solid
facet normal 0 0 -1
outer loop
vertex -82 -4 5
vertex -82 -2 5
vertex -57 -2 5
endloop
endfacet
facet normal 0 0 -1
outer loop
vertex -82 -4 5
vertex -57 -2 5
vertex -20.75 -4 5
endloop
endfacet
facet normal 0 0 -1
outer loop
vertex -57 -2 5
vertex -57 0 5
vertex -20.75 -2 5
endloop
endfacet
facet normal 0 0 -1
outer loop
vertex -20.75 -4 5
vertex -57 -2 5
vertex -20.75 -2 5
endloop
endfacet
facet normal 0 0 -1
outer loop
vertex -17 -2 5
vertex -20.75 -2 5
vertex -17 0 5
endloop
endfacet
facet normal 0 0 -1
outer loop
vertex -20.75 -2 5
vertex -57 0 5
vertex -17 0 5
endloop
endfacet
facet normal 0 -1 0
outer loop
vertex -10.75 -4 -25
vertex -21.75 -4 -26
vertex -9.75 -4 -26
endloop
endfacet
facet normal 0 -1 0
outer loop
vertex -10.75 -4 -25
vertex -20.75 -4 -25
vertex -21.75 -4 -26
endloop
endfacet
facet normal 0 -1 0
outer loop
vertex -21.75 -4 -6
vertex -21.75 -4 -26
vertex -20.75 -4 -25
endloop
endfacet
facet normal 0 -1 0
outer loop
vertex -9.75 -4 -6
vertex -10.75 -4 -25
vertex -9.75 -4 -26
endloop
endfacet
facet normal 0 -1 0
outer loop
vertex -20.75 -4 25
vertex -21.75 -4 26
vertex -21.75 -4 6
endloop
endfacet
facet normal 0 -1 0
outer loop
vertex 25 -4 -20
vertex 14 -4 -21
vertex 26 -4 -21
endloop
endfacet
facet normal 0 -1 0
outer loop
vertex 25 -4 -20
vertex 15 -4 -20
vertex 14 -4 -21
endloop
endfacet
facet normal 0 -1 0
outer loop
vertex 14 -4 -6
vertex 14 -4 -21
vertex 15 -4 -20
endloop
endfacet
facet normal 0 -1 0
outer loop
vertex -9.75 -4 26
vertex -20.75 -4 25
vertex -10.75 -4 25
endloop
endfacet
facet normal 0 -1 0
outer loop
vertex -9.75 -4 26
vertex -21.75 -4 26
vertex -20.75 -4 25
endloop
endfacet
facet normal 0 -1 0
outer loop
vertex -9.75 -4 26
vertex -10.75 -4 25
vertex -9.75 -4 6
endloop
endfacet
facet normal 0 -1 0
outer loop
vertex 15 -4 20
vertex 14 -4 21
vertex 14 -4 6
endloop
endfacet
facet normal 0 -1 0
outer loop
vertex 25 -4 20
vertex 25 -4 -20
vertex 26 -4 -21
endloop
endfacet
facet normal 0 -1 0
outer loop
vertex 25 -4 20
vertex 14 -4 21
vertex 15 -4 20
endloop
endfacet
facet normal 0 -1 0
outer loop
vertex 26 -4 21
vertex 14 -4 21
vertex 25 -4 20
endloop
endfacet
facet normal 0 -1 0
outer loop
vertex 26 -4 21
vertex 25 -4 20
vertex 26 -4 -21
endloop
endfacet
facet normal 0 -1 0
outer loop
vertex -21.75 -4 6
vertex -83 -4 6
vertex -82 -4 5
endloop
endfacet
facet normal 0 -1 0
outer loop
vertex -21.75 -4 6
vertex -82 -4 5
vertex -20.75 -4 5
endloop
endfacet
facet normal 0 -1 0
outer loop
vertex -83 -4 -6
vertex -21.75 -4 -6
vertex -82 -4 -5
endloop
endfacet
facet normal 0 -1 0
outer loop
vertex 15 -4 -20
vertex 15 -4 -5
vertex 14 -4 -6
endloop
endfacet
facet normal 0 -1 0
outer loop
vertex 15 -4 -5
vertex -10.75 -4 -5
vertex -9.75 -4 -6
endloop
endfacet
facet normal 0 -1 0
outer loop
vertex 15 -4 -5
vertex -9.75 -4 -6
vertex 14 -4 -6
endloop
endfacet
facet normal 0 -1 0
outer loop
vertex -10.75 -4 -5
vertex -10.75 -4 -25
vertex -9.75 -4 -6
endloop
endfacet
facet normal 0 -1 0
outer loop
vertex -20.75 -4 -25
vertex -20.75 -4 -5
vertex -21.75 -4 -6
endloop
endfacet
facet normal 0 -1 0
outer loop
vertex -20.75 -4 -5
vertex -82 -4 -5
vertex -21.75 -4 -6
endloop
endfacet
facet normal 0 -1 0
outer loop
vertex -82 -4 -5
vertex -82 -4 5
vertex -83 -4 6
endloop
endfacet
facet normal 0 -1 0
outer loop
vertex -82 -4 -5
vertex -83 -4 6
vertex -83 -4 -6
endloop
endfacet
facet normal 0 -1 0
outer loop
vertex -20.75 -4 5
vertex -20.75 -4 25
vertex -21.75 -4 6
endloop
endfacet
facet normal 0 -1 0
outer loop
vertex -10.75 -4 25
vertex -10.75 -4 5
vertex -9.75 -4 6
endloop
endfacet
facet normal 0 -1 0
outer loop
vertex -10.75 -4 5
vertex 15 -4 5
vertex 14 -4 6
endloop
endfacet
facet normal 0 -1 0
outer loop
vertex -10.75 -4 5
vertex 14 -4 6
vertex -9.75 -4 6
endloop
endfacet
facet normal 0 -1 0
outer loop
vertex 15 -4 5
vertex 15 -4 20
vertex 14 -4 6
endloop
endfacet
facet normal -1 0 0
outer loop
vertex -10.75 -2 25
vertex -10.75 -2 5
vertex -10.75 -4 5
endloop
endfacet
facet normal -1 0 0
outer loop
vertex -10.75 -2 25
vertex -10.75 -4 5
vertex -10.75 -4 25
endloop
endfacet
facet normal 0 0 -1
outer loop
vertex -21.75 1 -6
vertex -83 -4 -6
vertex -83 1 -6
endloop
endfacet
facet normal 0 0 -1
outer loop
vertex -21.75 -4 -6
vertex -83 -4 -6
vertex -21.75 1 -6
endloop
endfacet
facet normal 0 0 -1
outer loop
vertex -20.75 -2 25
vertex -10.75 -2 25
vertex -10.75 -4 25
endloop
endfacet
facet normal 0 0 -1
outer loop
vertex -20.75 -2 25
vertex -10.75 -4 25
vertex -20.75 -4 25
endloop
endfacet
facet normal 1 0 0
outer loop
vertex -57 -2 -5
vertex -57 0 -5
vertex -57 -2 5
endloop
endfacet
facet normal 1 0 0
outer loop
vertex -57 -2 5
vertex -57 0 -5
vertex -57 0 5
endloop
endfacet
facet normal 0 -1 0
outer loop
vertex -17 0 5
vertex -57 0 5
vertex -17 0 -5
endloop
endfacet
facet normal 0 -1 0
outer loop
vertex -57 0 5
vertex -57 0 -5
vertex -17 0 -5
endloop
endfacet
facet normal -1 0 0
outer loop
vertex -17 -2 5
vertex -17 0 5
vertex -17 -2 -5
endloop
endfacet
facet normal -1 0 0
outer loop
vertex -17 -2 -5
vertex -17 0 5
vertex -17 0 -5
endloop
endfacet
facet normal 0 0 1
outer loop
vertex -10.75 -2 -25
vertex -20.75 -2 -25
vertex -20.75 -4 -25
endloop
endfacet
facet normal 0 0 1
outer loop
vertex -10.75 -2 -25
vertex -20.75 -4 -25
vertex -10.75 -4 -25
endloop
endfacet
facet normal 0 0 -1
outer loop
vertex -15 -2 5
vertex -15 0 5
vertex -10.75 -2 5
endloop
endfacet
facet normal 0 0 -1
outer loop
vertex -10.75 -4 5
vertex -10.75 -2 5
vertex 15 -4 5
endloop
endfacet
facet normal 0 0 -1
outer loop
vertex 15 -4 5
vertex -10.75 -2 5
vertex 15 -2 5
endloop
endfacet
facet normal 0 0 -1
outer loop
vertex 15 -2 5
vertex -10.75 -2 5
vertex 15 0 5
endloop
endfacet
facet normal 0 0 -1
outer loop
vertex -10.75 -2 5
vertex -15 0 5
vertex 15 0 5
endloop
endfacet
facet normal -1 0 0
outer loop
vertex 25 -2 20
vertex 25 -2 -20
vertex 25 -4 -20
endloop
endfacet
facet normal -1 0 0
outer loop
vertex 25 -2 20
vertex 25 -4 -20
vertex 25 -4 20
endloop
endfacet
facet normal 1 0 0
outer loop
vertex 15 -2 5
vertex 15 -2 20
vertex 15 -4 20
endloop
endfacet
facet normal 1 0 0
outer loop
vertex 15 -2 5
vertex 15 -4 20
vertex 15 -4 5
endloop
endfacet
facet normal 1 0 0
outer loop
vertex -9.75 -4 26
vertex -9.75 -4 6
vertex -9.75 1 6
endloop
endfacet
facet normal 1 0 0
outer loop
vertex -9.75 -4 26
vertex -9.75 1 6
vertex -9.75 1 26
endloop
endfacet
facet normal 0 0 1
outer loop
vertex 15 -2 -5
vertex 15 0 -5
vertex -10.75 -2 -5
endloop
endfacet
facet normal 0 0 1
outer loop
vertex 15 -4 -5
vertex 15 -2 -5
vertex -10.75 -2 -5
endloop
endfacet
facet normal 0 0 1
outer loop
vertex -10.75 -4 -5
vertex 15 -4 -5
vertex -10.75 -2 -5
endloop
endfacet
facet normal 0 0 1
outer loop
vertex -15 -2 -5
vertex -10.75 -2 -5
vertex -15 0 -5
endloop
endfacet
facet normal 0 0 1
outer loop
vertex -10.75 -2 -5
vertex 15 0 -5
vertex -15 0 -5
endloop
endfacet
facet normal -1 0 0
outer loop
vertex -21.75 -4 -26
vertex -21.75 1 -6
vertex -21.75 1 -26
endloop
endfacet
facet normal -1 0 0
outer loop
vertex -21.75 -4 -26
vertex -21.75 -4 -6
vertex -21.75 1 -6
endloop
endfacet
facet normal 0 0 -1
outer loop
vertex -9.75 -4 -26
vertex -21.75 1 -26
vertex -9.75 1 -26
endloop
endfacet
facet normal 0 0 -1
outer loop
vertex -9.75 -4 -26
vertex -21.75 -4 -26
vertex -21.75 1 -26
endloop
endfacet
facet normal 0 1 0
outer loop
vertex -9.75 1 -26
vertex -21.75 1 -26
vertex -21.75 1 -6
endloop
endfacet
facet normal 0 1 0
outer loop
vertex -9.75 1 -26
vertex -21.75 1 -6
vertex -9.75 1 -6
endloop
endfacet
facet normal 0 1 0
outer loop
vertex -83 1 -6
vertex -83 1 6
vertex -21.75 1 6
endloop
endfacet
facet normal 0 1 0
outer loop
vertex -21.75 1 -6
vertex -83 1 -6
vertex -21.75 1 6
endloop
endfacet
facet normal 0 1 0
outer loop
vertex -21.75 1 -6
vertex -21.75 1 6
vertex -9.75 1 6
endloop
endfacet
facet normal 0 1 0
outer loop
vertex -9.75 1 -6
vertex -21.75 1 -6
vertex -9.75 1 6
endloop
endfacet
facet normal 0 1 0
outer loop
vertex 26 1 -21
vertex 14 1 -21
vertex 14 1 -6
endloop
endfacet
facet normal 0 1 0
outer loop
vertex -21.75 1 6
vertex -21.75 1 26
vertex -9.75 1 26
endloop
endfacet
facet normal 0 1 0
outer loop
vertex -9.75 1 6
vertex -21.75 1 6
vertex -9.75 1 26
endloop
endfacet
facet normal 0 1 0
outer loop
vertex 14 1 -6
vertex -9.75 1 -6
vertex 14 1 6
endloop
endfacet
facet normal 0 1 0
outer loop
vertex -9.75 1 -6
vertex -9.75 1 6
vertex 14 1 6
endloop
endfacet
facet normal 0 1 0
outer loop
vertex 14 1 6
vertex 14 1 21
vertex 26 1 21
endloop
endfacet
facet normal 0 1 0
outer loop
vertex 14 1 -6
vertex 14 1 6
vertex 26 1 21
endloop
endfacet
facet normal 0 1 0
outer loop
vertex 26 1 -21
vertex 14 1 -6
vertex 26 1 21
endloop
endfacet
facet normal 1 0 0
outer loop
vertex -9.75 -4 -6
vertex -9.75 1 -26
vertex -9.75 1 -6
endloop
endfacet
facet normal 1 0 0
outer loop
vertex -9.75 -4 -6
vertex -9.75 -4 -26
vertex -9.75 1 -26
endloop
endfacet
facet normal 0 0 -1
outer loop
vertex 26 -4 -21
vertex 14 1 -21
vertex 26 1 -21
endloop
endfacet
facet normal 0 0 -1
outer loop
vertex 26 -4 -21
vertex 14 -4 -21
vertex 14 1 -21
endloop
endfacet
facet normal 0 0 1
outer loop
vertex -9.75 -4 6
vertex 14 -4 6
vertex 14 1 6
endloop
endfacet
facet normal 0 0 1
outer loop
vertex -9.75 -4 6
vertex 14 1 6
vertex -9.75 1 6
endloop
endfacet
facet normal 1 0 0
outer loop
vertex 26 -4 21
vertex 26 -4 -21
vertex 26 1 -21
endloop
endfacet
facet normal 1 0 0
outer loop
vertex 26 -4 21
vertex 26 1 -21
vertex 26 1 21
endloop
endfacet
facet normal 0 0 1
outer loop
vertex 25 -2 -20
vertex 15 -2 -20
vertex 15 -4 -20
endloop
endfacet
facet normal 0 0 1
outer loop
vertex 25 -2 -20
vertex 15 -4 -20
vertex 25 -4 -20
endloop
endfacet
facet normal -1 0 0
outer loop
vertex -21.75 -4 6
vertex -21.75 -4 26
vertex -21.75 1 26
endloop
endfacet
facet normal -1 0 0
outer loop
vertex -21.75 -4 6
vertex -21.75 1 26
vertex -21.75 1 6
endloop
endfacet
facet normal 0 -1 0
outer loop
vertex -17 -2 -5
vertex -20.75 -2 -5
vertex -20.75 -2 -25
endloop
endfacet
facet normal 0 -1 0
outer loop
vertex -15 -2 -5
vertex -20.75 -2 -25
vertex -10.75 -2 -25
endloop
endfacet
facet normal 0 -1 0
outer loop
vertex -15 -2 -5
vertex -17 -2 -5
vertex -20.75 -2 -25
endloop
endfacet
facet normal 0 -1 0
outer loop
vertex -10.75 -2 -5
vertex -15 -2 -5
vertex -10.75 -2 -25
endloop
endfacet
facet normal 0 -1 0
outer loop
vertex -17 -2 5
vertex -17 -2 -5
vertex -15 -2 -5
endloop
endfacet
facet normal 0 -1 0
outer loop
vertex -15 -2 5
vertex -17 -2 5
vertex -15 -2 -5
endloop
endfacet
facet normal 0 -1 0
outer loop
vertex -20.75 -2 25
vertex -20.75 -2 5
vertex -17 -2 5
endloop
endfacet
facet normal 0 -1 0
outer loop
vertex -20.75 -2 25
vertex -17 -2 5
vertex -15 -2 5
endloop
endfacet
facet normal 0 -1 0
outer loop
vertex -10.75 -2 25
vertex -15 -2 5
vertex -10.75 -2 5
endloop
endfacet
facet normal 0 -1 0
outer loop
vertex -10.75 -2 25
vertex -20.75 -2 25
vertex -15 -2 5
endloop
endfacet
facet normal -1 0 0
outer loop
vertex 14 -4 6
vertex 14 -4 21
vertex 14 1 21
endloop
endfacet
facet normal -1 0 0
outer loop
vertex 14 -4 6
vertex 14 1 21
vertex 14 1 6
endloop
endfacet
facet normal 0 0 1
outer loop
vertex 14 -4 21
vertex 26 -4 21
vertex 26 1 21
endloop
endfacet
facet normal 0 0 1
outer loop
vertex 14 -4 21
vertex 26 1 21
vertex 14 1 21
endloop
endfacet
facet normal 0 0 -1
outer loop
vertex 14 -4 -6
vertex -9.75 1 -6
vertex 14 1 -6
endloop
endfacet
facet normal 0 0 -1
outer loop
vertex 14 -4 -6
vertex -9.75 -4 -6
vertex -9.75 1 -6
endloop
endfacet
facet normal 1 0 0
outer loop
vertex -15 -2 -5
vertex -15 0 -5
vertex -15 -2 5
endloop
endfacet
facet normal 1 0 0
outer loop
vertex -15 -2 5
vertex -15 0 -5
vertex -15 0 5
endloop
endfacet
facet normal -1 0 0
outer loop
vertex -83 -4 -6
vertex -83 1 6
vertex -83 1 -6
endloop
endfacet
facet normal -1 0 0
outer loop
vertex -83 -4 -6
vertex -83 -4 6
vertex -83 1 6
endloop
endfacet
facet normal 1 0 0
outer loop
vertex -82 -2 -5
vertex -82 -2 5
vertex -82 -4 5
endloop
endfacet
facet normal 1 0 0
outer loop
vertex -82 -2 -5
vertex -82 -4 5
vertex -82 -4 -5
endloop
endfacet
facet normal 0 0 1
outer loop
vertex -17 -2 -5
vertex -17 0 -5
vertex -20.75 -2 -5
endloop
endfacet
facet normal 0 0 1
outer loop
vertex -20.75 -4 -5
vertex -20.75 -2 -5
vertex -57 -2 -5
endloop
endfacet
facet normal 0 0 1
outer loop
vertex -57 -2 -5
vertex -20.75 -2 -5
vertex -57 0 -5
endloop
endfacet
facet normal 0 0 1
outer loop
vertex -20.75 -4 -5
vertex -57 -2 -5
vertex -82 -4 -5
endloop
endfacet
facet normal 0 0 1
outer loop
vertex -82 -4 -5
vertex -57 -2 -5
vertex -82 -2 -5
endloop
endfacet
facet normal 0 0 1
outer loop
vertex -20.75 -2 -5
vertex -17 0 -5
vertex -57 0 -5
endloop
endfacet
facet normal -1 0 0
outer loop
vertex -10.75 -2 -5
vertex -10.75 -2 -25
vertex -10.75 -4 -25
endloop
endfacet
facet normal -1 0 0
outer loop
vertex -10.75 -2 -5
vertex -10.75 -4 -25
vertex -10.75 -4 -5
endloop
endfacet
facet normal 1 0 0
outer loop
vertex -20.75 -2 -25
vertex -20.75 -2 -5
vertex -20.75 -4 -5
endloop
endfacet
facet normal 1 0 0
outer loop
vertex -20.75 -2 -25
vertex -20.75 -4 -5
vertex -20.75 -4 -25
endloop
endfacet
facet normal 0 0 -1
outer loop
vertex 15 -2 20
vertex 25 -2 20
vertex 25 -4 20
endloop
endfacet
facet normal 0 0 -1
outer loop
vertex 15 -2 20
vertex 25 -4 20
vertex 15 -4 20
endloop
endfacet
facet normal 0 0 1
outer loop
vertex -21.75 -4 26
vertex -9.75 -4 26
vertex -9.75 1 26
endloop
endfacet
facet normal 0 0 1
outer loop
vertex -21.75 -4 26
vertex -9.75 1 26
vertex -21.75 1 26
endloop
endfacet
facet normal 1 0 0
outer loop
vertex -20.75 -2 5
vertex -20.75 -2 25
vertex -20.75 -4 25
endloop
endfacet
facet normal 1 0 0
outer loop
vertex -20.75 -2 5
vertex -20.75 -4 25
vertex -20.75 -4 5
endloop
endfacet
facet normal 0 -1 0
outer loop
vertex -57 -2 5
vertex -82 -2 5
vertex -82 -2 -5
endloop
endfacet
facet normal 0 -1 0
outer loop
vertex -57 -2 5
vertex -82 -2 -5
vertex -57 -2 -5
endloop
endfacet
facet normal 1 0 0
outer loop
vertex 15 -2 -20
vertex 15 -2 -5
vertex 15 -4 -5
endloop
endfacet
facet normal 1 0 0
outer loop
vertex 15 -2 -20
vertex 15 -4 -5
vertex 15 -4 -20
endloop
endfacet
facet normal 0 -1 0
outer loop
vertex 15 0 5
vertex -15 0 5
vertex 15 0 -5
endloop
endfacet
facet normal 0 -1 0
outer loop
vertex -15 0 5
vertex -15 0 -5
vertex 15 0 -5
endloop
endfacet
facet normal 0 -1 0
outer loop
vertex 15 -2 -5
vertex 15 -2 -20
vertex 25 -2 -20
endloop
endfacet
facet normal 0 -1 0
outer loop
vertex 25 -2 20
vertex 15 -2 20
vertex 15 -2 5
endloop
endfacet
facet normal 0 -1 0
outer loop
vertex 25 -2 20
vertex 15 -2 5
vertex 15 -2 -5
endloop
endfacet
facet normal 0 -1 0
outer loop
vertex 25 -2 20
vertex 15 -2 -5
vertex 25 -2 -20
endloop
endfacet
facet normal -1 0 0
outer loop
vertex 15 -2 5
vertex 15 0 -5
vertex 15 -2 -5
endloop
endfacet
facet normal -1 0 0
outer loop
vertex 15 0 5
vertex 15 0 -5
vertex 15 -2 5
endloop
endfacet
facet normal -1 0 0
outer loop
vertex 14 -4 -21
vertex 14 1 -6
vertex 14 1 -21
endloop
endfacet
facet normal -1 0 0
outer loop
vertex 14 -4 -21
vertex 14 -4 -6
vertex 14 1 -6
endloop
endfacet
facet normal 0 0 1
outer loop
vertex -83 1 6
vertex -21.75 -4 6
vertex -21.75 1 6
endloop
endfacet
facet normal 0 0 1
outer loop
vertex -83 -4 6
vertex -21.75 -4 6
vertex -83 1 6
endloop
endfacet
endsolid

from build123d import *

# Parameters (mm, degrees)
SKETCH_3_W           = 10
SKETCH_3_H           = 40
SKETCH_3_W_2         = 25.75
SKETCH_3_H_2         = 10
SKETCH_3_W_3         = 36.25
SKETCH_3_W_4         = 25
EXTRUDE_1_DEPTH      = 1
EXTRUDE_2_DEPTH      = 4
EXTRUDE_2_DEPTH_BACK = 1
SKETCH_5_W           = 25
SKETCH_5_H           = 10
SKETCH_5_W_2         = 10
SKETCH_5_H_2         = 40
EXTRUDE_3_DEPTH      = 2


with BuildPart() as part:
    # 草图3 → 凸台-拉伸1 (new body)
    with BuildSketch(Plane(origin=(0, 0, 0), x_dir=(1, 0, 0), z_dir=(0, 1, 0))):
        with Locations((20, 0)):
            Rectangle(SKETCH_3_W, SKETCH_3_H)
        with Locations((2.125, 0)):
            Rectangle(SKETCH_3_W_2, SKETCH_3_H_2)
        Polygon((-10.75, -5), (-10.75, 5), (-10.75, 25), (-20.75, 25), (-20.75, 5), (-20.75, -5), (-20.75, -25), (-10.75, -25), align=None)
        with Locations((-38.875, 0)):
            Rectangle(SKETCH_3_W_3, SKETCH_3_H_2)
        with Locations((-69.5, 0)):
            Rectangle(SKETCH_3_W_4, SKETCH_3_H_2)
    extrude(amount=EXTRUDE_1_DEPTH)

    # 草图4 → 凸台-拉伸2 (add, two sides)
    with BuildSketch(Plane.XZ) as extrude_2_sk:
        Polygon((14, -21), (26, -21), (26, 21), (14, 21), (14, 6), (-9.75, 6), (-9.75, 26), (-21.75, 26), (-21.75, 6), (-83, 6), (-83, -6), (-21.75, -6), (-21.75, -26), (-9.75, -26), (-9.75, -6), (14, -6), align=None)
        Polygon((15, -20), (25, -20), (25, 20), (15, 20), (15, 5), (-10.75, 5), (-10.75, 25), (-20.75, 25), (-20.75, 5), (-82, 5), (-82, -5), (-20.75, -5), (-20.75, -25), (-10.75, -25), (-10.75, -5), (15, -5), align=None, mode=Mode.SUBTRACT)
    extrude(amount=EXTRUDE_2_DEPTH)
    extrude(extrude_2_sk.sketch, amount=-EXTRUDE_2_DEPTH_BACK)

    # 草图5 → 凸台-拉伸3 (add)
    with BuildSketch(Plane.XZ):
        Polygon((-20.75, 25), (-20.75, 5), (-17, 5), (-17, -5), (-20.75, -5), (-20.75, -25), (-10.75, -25), (-10.75, -5), (-15, -5), (-15, 5), (-10.75, 5), (-10.75, 25), align=None)
        with Locations((-69.5, 0)):
            Rectangle(SKETCH_5_W, SKETCH_5_H)
        with Locations((20, 0)):
            Rectangle(SKETCH_5_W_2, SKETCH_5_H_2)
    extrude(amount=EXTRUDE_3_DEPTH)


solid = part.part
